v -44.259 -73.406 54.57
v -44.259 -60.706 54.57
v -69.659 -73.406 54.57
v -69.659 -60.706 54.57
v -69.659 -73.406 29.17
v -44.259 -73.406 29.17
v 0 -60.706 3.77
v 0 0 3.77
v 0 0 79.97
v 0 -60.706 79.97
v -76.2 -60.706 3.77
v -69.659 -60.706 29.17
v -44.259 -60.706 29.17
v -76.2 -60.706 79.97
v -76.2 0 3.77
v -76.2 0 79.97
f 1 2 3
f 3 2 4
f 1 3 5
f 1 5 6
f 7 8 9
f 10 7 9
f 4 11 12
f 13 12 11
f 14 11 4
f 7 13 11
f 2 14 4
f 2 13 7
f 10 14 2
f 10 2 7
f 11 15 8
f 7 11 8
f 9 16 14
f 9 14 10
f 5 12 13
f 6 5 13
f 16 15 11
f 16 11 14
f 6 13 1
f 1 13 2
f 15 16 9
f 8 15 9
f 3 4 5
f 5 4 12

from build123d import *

# Parameters (mm, degrees)
F0_W      = 76.2
F0_H      = 76.2
F1_DEPTH  = 25.4
F1_FACE_W = 76.2
F1_FACE_H = 76.2
F2_DEPTH  = 35.306
F4_DEPTH  = 12.7


with BuildPart() as f1:
    # F0 (on Front) → F1 (new body)
    with BuildSketch(Plane.XZ):
        with Locations((-38.1, 41.869526)):
            Rectangle(F0_W, F0_H)
    extrude(amount=F1_DEPTH)

    # F0 (on Front) + F1_face (on face) → F2 (join)
    with BuildSketch(Plane.XZ):
        with Locations((-38.1, 41.869526)):
            Rectangle(F0_W, F0_H)
    with BuildSketch(Plane(origin=(-38.1, -25.4, 41.869526), x_dir=(1, 0, 0), z_dir=(0, -1, 0))):
        Rectangle(F1_FACE_W, F1_FACE_H)
    extrude(amount=F2_DEPTH)

    # F3 (on face) → F4 (join)
    with BuildSketch(Plane.XZ.offset(60.706)):
        Polygon((-44.259132, 29.169526), (-44.259132, 54.569526), (-56.959132, 54.569526), (-60.402479, 54.569526), (-69.659132, 54.569526), (-69.659132, 29.169526), align=None)
    extrude(amount=F4_DEPTH)


solid = f1.part
